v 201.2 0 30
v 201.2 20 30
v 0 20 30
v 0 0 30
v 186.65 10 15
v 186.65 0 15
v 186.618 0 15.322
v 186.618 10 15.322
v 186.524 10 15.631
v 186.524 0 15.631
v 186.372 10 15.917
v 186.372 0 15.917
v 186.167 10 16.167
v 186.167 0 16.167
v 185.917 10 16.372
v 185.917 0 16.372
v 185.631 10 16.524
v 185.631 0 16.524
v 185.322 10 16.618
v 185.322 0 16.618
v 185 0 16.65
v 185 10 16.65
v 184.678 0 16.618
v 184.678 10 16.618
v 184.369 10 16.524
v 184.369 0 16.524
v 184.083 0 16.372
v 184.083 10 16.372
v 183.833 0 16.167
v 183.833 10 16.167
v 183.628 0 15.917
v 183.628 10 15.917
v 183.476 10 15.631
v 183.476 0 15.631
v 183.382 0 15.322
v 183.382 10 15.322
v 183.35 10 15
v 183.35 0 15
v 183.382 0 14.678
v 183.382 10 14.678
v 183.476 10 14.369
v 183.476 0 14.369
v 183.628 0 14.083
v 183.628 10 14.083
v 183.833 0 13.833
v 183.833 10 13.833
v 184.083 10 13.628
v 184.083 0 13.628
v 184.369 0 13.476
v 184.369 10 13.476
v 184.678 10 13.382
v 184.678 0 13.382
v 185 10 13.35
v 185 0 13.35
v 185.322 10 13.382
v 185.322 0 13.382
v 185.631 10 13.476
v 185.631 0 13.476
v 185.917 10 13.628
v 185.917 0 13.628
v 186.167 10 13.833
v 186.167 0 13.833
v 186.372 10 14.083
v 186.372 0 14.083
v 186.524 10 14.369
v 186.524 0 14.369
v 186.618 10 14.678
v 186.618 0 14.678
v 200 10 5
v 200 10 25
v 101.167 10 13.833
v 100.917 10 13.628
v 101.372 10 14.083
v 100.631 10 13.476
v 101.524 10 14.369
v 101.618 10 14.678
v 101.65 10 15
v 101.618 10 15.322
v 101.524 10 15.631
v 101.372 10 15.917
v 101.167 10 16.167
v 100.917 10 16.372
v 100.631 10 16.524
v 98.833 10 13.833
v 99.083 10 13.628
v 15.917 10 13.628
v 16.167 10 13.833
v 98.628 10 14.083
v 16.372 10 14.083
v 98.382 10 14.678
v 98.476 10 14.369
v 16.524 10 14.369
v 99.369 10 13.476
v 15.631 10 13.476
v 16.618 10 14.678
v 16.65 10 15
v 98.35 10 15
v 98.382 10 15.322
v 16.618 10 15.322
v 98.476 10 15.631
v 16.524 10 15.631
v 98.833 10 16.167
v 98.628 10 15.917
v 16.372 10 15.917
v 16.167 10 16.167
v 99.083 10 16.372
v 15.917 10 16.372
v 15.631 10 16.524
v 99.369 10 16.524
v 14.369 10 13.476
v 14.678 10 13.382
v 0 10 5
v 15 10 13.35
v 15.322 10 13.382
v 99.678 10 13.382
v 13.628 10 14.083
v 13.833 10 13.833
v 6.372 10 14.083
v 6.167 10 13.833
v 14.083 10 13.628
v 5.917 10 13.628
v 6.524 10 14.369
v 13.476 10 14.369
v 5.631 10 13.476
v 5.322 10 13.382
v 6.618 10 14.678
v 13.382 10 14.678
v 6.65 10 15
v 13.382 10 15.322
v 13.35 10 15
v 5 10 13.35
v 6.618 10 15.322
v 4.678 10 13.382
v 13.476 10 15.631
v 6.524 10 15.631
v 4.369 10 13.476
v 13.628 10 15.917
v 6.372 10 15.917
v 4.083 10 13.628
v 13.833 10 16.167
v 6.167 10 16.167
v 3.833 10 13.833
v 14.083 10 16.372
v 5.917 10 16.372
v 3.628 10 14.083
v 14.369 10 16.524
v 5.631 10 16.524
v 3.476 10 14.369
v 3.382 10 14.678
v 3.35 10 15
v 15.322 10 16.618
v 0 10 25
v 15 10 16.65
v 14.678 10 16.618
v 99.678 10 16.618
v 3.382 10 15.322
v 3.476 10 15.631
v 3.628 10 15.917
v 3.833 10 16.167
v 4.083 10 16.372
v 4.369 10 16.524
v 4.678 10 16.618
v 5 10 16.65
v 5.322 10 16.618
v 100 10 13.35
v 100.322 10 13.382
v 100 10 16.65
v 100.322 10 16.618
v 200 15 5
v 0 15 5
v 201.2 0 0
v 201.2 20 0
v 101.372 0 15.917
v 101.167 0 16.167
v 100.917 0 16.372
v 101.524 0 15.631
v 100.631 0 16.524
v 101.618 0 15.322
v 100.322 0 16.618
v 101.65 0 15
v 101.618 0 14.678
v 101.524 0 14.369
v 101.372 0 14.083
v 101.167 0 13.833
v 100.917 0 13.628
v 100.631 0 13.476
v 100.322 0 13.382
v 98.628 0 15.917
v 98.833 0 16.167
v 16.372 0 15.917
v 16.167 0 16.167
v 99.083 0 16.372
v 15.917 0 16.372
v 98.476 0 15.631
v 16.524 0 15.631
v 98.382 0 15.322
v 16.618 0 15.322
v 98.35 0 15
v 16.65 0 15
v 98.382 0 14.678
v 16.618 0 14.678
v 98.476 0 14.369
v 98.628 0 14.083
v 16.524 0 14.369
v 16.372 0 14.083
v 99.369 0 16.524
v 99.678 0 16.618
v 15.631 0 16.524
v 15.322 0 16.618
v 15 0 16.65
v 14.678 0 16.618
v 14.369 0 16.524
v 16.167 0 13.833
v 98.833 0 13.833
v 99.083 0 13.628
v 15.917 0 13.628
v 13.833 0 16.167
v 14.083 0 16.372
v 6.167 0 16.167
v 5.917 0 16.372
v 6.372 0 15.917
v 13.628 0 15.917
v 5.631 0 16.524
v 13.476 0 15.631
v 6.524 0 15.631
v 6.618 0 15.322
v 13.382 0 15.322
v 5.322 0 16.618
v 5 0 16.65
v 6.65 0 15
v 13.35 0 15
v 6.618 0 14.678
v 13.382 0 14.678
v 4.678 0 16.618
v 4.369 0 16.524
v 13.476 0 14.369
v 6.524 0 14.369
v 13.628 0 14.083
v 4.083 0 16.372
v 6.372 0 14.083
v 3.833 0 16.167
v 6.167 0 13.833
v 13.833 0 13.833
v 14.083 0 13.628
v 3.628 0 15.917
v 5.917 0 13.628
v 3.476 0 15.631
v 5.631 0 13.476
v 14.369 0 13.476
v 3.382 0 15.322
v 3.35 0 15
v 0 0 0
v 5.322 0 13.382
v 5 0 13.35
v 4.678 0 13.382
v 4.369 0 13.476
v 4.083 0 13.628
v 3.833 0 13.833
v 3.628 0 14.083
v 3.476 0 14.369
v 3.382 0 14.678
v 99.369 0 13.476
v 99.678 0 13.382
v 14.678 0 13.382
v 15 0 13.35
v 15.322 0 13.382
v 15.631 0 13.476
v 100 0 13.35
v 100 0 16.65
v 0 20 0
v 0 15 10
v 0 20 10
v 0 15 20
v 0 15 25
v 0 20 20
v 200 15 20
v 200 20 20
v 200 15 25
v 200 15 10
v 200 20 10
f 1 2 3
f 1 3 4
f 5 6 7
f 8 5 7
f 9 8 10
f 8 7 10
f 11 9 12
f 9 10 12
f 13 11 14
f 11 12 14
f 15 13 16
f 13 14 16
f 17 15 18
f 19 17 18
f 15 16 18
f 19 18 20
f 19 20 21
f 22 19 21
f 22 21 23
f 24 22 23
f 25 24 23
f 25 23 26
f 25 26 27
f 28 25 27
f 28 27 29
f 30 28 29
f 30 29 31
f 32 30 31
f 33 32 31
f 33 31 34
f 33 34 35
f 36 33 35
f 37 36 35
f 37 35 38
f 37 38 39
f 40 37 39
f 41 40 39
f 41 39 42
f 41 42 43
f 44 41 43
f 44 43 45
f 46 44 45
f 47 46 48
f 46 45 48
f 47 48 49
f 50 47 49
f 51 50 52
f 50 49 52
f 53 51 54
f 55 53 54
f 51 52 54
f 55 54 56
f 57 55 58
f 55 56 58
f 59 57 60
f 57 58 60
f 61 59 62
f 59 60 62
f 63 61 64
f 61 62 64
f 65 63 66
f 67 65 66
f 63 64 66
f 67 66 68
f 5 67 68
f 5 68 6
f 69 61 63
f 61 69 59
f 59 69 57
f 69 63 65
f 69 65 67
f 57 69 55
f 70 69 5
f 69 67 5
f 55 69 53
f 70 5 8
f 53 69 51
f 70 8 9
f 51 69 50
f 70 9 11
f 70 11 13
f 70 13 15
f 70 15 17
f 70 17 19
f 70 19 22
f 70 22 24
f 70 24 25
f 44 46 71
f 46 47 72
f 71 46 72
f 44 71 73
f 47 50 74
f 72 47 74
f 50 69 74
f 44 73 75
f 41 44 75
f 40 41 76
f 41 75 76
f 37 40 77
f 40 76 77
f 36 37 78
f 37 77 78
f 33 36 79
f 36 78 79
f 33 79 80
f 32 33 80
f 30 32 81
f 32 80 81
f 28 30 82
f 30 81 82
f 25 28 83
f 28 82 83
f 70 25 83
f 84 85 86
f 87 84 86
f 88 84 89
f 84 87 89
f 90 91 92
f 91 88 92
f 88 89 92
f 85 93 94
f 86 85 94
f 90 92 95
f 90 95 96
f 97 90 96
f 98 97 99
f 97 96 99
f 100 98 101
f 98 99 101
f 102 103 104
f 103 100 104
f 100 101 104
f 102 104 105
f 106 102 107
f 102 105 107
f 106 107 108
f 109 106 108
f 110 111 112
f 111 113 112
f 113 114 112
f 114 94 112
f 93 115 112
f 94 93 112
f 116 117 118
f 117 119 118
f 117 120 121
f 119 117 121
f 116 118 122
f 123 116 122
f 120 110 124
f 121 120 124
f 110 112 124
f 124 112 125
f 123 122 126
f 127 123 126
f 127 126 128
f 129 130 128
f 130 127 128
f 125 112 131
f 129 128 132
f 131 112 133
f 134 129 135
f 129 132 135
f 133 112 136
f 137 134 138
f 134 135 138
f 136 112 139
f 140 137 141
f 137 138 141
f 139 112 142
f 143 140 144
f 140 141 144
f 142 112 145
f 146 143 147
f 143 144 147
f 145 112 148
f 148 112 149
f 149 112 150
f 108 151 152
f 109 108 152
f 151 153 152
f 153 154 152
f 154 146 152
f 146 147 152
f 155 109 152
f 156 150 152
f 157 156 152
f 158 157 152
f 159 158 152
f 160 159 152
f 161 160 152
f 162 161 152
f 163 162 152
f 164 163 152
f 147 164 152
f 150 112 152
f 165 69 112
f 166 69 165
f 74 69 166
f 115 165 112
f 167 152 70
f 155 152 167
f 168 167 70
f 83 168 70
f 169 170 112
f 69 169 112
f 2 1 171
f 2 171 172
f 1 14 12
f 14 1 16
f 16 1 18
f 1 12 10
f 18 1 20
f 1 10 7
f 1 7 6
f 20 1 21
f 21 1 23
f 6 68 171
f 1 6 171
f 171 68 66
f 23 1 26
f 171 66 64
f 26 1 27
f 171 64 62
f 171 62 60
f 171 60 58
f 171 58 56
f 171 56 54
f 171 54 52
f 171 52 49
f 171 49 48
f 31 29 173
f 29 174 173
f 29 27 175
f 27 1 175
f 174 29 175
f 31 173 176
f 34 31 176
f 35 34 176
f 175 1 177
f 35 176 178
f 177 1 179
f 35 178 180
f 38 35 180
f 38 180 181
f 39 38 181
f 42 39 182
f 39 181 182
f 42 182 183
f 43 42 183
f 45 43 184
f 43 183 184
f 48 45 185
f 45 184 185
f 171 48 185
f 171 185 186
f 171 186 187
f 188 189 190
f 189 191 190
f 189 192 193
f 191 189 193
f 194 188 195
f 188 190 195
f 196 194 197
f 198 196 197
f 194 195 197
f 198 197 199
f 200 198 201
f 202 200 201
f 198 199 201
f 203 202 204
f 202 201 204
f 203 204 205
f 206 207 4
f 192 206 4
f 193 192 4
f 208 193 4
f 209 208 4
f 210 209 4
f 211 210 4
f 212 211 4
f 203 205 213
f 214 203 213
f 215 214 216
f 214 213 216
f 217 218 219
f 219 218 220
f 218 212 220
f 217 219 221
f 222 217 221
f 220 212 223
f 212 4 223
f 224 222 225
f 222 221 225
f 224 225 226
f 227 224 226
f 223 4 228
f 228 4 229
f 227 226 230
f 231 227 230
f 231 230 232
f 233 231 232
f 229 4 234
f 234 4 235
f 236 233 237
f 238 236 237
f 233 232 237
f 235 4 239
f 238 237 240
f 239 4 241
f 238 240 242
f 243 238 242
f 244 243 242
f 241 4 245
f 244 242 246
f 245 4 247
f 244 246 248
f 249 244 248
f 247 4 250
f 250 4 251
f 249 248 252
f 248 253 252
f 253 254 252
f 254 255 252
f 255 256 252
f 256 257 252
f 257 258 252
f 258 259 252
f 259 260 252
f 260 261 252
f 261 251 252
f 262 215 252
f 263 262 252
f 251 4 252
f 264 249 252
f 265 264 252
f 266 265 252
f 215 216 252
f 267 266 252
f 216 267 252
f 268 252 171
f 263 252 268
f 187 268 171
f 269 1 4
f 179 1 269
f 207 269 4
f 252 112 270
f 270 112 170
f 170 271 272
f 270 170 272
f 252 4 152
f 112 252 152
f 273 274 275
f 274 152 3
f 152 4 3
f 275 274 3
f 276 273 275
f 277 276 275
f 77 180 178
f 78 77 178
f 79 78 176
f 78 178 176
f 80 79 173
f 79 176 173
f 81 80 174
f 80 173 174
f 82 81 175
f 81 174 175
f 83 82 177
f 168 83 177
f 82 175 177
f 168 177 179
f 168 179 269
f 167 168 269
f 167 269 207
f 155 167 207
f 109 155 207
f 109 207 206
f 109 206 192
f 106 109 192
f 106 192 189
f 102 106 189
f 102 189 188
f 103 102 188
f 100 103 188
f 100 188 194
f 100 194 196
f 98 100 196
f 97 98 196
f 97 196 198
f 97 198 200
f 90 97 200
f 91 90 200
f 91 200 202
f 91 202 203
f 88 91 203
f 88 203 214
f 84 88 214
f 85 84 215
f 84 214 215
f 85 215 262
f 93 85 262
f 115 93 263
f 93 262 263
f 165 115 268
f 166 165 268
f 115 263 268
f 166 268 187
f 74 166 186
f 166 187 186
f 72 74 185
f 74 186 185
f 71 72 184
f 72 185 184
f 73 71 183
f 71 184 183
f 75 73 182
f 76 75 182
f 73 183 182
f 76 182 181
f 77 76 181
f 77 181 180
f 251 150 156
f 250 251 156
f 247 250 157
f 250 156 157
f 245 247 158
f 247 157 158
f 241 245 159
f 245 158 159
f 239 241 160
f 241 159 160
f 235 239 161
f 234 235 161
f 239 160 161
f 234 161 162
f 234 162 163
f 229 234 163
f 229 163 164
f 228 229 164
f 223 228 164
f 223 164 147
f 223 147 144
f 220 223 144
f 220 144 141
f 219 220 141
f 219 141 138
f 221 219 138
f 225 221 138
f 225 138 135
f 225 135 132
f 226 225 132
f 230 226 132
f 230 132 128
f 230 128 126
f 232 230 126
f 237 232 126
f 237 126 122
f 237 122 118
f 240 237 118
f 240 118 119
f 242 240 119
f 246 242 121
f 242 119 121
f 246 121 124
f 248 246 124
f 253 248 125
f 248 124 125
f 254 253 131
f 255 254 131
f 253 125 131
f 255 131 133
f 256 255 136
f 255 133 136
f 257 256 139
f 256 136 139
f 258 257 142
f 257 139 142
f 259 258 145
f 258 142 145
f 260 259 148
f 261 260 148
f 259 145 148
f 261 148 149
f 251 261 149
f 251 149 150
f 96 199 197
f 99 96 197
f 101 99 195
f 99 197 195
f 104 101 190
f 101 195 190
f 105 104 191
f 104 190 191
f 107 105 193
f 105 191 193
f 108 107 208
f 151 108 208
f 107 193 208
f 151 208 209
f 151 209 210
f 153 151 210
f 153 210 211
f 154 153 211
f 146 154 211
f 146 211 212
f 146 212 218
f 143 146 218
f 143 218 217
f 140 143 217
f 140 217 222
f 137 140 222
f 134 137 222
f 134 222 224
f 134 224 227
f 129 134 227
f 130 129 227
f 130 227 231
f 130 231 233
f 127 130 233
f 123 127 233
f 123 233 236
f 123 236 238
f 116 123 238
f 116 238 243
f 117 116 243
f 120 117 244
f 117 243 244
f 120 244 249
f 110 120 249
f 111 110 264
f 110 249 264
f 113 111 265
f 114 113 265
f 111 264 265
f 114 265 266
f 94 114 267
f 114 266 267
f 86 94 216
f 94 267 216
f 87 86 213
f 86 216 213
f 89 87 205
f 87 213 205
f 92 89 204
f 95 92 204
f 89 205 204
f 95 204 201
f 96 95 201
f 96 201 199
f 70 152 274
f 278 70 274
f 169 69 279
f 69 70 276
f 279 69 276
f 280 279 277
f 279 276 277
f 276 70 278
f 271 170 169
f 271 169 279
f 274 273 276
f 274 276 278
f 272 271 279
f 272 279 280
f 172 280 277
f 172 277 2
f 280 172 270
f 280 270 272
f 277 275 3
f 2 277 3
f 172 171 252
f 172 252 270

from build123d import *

# Parameters (mm, degrees)
F0_W     = 5
F0_H     = 5
F1_DEPTH = 200
F3_DEPTH = 1.2
F5_DEPTH = 25
F6_D     = 3.3


with BuildPart() as f1:
    # F0 (on Right) → F1 (new body)
    with BuildSketch(Plane.YZ):
        Polygon((0, 30), (0, 15), (6.1031254008, 15), (10, 15), (10, 25), (15, 25), (20, 25), (20, 30), align=None)
        with Locations((17.5, 22.5)):
            Rectangle(F0_W, F0_H)
        with Locations((17.5, 7.5)):
            Rectangle(F0_W, F0_H)
        Polygon((0, 15), (0, 0), (20, 0), (20, 5), (15, 5), (10, 5), (10, 15), (6.1031254008, 15), align=None)
    extrude(amount=F1_DEPTH)

    # F2 (on face) → F3 (join)
    with BuildSketch(Plane.YZ.offset(200)):
        Polygon((20, 30), (0, 30), (0, 0), (20, 0), (20, 10), (15, 10), (15, 5), (10, 5), (10, 25), (15, 25), (15, 20), (20, 20), align=None)
        Polygon((20, 10), (20, 20), (15, 20), (15, 25), (10, 25), (10, 5), (15, 5), (15, 10), align=None)
    extrude(amount=F3_DEPTH)

    # F4 (on face) → F5 (cut)
    with BuildSketch(Plane(origin=(0, 10, 0), x_dir=(-1, 0, 0), z_dir=(0, 1, 0))):
        with BuildLine():
            ThreePointArc((-6.65, 15), (-5, 13.35), (-3.35, 15))
            Line((-3.35, 15), (-5, 15))
            Line((-5, 15), (-6.65, 15))
        make_face()
        with BuildLine():
            Line((-5, 15), (-3.35, 15))
            ThreePointArc((-3.35, 15), (-5, 16.65), (-6.65, 15))
            Line((-6.65, 15), (-5, 15))
        make_face()
    extrude(amount=-F5_DEPTH, mode=Mode.SUBTRACT)

    # F6 (through all)
    with Locations(Plane(origin=(0, 10, 0), x_dir=(-1, 0, 0), z_dir=(0, 1, 0))):
        with Locations((-15, 15), (-100, 15), (-185, 15)):
            Hole(F6_D / 2)


solid = f1.part
